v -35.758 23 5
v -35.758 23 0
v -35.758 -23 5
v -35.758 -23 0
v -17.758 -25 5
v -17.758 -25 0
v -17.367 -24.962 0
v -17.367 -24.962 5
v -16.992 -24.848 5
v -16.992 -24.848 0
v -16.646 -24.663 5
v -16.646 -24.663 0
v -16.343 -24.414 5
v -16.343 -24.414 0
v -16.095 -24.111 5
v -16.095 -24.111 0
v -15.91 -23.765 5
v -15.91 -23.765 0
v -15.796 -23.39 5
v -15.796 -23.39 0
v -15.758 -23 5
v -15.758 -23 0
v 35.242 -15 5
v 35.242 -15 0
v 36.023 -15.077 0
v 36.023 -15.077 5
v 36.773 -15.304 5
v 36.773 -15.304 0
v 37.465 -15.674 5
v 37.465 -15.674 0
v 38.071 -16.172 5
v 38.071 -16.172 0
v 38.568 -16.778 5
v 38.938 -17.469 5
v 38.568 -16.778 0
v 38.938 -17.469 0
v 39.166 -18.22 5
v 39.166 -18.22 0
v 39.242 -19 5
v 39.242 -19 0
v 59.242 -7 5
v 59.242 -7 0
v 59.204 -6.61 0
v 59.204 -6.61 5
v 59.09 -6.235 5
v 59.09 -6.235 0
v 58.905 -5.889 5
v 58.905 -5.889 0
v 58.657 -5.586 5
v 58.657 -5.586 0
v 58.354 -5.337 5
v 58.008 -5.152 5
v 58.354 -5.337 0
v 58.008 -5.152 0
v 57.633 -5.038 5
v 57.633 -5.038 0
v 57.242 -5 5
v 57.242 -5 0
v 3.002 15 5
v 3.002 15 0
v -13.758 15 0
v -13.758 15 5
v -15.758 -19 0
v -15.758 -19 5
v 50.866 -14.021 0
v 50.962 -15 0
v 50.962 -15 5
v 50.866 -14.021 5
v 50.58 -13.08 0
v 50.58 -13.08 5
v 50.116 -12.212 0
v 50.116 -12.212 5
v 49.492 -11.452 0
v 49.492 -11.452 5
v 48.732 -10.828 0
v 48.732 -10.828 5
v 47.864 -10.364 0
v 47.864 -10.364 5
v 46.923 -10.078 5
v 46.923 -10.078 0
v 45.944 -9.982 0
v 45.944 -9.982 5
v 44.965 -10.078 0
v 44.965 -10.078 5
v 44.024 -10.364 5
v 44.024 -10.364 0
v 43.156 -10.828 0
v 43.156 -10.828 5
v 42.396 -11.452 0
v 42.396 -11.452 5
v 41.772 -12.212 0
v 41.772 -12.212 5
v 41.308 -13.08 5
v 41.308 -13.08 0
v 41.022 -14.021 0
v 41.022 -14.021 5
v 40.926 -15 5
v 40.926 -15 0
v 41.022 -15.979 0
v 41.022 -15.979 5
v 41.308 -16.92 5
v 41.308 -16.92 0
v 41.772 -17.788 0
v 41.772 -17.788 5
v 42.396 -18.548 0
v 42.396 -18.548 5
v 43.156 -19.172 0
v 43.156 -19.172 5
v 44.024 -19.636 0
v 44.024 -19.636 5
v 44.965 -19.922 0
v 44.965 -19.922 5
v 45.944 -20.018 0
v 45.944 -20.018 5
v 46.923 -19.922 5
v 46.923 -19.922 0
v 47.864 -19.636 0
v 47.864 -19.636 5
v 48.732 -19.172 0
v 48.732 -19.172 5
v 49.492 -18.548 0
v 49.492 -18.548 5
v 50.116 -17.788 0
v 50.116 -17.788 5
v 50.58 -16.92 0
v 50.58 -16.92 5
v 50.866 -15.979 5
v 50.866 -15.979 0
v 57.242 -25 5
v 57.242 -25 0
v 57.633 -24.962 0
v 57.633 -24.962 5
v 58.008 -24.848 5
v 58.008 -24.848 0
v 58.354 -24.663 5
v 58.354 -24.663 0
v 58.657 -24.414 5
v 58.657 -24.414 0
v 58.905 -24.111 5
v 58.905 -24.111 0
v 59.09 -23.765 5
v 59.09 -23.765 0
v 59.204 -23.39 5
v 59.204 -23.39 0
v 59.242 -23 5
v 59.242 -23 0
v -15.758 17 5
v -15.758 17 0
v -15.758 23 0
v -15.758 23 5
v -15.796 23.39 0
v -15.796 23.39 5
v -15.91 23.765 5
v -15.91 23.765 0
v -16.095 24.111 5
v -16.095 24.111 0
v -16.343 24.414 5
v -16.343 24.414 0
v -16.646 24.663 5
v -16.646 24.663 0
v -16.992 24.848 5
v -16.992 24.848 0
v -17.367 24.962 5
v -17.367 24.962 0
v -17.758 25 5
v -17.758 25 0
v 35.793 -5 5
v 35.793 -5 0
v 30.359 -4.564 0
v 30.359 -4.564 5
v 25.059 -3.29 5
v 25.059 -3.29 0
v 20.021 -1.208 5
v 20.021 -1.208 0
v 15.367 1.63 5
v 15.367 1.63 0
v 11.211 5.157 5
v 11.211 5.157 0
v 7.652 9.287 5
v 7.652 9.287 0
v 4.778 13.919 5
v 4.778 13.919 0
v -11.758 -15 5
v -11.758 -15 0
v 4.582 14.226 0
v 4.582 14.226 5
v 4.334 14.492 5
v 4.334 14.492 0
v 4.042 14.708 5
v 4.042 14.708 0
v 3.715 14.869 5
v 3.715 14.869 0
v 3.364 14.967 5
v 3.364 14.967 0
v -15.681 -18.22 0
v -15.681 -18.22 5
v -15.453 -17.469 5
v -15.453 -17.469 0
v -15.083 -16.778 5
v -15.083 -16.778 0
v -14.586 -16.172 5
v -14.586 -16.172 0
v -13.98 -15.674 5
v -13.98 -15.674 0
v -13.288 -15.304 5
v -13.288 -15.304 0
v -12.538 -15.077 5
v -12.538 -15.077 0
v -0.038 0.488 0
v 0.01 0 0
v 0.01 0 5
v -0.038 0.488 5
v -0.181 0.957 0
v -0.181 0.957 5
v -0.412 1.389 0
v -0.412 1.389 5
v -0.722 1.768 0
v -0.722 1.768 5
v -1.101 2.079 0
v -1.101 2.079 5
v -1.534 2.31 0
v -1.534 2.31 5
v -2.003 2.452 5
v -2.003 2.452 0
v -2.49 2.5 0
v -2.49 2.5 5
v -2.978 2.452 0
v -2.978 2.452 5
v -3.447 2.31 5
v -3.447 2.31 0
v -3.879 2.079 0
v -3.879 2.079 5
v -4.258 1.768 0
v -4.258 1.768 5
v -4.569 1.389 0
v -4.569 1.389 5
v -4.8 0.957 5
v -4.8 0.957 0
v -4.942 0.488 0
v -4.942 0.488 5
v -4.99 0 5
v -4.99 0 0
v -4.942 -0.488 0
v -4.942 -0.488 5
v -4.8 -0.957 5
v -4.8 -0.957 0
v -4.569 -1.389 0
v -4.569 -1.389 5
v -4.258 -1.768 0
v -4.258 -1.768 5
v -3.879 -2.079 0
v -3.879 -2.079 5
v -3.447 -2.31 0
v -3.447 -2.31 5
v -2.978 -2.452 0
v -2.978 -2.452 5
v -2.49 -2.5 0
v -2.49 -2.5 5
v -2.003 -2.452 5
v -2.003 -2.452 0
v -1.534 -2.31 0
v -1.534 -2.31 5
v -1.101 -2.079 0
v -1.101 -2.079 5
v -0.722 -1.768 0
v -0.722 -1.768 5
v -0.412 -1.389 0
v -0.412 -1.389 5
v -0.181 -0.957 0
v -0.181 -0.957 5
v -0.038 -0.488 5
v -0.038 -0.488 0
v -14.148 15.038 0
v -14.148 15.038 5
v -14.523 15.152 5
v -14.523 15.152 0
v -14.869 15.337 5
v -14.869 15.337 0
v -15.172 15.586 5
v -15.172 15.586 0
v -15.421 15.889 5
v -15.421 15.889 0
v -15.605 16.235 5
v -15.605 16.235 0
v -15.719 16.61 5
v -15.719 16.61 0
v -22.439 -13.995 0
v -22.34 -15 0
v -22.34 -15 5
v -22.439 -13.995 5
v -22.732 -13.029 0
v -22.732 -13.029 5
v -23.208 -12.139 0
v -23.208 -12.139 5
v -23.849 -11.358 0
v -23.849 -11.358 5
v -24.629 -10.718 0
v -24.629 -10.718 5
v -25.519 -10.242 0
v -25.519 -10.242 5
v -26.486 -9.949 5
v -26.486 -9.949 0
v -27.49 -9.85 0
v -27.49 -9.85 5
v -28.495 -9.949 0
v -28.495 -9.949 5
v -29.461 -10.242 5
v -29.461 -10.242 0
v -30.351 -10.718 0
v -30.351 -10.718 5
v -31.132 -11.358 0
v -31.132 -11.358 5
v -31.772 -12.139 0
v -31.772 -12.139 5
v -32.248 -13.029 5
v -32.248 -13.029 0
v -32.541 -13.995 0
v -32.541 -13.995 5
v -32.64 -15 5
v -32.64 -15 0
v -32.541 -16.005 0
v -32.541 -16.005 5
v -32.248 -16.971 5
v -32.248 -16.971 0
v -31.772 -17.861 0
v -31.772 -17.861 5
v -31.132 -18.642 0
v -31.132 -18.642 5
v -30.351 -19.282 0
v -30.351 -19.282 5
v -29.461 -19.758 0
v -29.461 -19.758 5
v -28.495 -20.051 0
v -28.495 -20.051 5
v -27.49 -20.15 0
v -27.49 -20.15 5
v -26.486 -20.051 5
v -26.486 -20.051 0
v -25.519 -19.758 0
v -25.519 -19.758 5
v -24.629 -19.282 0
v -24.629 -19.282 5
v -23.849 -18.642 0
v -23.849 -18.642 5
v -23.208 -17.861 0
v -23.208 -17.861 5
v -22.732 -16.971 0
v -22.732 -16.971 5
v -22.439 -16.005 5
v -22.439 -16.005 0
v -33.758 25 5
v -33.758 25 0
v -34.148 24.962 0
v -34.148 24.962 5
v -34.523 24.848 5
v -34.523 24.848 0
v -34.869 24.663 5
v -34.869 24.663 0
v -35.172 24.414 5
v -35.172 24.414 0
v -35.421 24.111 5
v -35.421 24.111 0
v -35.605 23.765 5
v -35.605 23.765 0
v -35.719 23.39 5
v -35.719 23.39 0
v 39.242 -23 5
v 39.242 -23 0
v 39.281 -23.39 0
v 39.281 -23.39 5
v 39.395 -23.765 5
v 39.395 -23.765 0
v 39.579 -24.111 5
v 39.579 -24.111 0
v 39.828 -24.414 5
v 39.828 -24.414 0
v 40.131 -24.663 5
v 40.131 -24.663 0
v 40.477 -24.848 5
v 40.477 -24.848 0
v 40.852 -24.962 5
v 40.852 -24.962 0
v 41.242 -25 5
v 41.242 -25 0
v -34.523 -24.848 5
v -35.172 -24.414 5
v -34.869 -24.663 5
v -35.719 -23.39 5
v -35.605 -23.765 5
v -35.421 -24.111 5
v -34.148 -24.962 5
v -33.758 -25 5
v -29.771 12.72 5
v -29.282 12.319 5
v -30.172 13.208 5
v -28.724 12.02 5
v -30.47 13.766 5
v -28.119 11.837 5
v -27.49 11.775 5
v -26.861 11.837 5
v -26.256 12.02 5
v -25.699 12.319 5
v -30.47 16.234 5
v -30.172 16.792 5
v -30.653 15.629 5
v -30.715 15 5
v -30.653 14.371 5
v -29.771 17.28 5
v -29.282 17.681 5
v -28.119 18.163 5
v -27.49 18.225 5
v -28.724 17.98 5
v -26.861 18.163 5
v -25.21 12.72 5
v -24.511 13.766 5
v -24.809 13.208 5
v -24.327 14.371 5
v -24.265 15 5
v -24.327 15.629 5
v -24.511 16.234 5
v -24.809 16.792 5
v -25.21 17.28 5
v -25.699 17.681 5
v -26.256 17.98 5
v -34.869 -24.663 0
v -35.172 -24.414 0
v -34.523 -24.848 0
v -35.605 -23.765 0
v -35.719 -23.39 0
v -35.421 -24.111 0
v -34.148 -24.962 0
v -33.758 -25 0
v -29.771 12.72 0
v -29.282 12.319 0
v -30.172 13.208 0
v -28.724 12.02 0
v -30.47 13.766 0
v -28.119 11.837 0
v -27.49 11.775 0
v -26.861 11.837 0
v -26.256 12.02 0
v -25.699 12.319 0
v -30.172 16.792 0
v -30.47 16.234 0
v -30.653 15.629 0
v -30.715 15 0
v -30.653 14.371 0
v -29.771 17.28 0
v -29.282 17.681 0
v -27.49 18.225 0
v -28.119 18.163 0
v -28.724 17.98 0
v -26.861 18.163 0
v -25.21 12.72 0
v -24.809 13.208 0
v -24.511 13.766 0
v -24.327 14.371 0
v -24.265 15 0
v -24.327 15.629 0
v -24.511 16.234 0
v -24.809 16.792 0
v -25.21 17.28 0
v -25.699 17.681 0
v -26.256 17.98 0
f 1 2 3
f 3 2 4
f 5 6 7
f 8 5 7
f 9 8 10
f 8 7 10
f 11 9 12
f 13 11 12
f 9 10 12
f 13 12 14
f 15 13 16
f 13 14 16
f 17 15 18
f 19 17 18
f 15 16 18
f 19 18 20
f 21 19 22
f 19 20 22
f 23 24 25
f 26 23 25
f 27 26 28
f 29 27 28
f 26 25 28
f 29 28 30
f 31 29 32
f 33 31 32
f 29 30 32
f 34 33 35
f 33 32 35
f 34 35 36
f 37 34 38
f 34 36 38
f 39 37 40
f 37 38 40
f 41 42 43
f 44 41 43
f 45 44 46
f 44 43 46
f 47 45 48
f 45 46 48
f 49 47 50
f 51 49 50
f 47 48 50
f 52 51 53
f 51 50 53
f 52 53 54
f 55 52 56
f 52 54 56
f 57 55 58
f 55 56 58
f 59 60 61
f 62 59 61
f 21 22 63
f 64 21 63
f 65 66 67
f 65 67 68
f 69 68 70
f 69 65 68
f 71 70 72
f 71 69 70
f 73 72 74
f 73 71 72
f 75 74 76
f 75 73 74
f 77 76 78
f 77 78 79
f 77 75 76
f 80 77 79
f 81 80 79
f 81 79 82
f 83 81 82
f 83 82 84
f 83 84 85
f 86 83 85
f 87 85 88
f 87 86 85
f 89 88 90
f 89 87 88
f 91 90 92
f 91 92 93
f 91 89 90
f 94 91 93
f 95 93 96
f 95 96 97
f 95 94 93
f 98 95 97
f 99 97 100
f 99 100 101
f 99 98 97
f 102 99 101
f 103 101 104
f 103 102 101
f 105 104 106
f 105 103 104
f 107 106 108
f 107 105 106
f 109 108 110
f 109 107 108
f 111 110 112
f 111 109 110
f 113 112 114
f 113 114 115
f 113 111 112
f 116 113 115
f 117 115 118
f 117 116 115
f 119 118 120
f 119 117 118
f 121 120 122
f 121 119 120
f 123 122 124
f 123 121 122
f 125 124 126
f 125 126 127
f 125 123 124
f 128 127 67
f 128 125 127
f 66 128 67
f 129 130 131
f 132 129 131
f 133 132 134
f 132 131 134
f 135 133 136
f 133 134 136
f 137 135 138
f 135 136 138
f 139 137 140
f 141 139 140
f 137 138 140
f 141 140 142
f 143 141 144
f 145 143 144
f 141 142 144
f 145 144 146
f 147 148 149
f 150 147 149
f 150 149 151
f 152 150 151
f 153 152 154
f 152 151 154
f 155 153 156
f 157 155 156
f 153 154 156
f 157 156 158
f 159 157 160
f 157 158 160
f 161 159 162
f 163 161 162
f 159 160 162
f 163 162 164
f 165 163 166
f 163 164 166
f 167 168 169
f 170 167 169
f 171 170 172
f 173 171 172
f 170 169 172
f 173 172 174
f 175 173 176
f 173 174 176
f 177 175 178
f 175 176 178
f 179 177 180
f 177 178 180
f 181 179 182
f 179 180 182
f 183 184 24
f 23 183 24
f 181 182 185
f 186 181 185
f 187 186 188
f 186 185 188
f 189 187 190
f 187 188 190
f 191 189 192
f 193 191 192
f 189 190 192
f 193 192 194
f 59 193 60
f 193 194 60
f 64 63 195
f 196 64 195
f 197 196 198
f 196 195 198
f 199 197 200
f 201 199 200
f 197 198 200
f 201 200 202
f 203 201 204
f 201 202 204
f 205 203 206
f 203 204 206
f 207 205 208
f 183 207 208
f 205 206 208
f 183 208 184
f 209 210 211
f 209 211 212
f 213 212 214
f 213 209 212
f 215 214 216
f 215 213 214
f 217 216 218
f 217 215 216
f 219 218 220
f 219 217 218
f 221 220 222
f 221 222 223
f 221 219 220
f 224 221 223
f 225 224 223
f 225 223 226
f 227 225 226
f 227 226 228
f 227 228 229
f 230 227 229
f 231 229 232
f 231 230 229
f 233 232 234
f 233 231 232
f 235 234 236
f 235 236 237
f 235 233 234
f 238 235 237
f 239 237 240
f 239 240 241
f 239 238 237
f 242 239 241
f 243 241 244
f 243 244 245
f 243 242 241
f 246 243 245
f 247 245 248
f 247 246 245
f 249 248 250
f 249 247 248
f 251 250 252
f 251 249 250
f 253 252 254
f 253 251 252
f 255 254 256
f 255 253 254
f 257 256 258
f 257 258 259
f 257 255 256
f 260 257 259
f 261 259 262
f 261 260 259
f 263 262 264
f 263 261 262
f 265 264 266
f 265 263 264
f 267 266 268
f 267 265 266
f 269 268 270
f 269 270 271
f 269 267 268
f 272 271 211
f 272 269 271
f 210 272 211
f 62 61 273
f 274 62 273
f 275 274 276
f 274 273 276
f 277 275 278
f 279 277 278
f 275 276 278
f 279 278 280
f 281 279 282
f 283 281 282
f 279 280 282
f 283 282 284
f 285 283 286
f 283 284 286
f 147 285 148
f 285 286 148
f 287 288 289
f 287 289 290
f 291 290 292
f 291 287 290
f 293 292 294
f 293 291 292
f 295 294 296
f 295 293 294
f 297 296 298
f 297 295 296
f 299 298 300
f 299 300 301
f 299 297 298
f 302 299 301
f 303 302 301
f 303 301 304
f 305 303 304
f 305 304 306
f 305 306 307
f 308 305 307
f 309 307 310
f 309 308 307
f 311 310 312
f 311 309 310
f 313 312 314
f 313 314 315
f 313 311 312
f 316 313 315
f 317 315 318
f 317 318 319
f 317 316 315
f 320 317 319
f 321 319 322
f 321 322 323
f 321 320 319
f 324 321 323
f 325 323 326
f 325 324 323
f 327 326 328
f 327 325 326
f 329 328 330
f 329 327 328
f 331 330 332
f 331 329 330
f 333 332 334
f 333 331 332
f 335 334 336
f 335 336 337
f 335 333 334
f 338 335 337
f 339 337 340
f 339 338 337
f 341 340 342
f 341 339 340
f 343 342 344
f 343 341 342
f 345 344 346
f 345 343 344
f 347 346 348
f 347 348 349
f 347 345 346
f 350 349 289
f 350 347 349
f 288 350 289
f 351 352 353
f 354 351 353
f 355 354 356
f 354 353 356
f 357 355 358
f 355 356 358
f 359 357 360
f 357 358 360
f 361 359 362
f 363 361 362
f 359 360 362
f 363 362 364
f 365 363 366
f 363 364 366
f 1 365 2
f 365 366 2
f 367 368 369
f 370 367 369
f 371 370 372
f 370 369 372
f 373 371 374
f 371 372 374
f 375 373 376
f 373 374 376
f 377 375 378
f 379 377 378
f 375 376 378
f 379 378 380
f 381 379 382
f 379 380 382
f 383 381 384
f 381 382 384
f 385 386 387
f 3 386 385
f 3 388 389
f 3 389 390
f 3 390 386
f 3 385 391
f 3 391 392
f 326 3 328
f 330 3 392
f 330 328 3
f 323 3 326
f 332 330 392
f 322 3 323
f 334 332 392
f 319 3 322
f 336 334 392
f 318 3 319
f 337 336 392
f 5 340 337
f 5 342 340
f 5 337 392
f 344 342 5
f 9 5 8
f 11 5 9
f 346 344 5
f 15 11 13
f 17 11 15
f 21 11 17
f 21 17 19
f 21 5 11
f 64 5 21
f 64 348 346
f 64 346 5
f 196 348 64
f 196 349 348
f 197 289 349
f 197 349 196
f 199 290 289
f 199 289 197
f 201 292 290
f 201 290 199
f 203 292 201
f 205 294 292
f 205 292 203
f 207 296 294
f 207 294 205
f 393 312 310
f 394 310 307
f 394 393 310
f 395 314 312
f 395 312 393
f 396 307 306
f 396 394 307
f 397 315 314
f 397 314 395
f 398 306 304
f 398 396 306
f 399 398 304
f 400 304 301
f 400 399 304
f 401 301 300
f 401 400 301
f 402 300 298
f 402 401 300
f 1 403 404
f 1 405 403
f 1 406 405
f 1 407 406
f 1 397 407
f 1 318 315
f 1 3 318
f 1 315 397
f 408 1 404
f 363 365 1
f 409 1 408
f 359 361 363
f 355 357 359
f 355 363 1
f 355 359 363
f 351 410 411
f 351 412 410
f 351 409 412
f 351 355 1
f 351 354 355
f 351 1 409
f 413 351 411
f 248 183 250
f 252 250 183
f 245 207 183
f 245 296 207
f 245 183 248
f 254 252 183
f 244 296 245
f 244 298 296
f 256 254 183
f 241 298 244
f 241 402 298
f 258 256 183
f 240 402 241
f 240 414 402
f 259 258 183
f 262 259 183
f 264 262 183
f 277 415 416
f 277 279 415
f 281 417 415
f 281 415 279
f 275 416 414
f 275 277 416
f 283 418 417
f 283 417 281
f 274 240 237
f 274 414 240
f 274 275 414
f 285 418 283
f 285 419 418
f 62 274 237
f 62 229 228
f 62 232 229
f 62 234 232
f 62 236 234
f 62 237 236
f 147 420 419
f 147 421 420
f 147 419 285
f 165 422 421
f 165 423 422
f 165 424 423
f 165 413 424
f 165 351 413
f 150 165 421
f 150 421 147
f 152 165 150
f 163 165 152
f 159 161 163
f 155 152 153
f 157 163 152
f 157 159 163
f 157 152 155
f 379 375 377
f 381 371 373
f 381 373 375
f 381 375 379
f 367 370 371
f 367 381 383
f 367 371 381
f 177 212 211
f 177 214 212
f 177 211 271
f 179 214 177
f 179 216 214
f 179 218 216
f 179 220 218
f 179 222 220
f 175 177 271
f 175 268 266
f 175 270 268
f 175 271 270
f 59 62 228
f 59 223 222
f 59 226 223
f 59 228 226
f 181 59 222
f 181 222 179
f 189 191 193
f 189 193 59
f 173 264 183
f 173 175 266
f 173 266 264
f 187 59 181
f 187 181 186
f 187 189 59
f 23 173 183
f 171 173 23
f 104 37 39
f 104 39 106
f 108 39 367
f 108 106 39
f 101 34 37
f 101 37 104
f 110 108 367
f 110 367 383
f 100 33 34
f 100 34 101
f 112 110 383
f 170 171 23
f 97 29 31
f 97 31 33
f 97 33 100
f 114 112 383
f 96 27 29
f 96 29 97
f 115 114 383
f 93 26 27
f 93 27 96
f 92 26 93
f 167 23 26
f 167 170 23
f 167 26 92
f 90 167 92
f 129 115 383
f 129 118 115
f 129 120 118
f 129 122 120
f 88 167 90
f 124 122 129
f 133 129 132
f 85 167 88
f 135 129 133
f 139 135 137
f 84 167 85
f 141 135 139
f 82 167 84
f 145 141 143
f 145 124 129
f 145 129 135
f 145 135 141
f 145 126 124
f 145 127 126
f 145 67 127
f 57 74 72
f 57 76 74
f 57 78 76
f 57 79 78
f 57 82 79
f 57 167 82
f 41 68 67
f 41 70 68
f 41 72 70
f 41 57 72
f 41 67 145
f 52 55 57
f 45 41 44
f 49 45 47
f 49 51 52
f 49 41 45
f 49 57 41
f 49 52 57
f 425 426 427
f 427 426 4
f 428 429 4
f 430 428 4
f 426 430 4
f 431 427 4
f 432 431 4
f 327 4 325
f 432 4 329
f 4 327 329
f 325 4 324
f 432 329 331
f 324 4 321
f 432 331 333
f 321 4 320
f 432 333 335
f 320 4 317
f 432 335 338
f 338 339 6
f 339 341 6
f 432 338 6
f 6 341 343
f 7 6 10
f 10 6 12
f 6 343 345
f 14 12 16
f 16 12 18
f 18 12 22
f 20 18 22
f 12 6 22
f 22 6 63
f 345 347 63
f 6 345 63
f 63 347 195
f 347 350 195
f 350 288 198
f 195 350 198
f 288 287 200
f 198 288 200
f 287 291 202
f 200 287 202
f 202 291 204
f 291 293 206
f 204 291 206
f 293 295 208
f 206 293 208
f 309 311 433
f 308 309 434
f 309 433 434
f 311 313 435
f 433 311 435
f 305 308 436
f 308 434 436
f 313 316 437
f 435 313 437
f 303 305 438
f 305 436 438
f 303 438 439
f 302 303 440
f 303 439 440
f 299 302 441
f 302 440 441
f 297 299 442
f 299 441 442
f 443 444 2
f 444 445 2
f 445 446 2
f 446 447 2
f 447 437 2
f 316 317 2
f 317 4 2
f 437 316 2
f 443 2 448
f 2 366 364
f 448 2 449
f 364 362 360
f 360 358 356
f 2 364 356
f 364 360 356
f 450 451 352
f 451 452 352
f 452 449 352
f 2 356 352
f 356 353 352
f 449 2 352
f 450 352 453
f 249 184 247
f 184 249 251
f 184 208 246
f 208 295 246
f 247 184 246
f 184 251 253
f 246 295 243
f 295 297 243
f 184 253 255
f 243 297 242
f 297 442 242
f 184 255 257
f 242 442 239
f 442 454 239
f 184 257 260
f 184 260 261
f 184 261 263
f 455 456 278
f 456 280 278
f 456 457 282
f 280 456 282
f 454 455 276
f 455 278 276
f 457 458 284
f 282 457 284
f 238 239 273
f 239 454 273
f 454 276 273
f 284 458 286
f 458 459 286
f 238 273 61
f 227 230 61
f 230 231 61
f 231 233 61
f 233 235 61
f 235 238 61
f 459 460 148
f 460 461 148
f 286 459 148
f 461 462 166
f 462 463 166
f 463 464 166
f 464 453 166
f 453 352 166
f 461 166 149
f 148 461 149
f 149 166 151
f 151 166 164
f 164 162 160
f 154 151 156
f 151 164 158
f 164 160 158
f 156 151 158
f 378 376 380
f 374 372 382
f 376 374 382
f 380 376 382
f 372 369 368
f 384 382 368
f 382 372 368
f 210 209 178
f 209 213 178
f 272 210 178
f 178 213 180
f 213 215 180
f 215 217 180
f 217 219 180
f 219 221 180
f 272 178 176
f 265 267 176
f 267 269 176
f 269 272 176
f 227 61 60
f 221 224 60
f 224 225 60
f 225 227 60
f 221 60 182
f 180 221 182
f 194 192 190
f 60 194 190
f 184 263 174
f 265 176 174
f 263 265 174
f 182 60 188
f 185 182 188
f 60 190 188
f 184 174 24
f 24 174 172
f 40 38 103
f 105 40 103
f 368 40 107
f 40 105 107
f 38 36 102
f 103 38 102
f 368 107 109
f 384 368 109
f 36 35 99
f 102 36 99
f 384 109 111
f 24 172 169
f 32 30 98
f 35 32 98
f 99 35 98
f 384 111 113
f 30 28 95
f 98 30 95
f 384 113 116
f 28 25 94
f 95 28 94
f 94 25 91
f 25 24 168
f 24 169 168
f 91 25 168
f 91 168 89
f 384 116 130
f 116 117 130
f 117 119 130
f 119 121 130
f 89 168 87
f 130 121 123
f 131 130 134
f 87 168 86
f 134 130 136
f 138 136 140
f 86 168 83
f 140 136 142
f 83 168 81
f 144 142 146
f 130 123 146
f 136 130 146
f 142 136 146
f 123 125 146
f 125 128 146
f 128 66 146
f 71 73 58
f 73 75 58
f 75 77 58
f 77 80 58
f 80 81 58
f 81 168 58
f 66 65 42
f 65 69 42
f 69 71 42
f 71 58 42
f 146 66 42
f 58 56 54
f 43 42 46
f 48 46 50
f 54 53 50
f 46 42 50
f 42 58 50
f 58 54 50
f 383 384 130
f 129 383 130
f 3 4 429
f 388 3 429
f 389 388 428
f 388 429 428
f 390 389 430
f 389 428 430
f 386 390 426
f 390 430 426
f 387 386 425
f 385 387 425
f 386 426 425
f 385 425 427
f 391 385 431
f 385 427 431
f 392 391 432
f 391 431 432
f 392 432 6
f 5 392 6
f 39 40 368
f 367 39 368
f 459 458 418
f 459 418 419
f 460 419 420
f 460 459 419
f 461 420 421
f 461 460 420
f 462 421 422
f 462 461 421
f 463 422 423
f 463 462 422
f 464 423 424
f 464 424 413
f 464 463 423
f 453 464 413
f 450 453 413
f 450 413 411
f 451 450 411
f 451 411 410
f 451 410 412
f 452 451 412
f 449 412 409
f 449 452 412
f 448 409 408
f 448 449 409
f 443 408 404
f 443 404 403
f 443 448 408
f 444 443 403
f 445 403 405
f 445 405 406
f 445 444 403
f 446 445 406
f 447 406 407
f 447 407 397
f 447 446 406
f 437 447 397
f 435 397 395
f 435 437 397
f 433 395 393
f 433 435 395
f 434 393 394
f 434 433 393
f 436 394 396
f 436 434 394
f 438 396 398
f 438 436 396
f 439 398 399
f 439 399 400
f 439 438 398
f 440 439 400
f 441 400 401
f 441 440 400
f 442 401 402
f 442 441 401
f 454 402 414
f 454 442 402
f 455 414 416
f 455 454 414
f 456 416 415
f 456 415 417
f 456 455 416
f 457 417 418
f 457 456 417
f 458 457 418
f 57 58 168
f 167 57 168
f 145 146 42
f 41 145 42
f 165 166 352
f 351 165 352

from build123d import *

# Parameters (mm, degrees)
SKETCH1_R           = 5.018077717
SKETCH1_R_2         = 5.15
SKETCH1_R_3         = 3.225
SKETCH1_R_4         = 2.5
BOSS_EXTRUDE1_DEPTH = 5


with BuildPart() as part:
    # Sketch1 → Boss-Extrude1 (new body)
    with BuildSketch(Plane.XY):
        with BuildLine():
            Line((4.242424242, -15), (35.242424242, -15))
            ThreePointArc((35.242424242, -15), (38.070851367, -16.171572875), (39.242424242, -19))
            Line((39.242424242, -19), (39.242424242, -23))
            ThreePointArc((39.242424242, -23), (39.82821068, -24.414213562), (41.242424242, -25))
            Line((41.242424242, -25), (57.242424242, -25))
            ThreePointArc((57.242424242, -25), (58.656637805, -24.414213562), (59.242424242, -23))
            Line((59.242424242, -23), (59.242424242, -7))
            ThreePointArc((59.242424242, -7), (58.656637805, -5.585786438), (57.242424242, -5))
            Line((57.242424242, -5), (35.792732382, -5))
            ThreePointArc((35.792732382, -5), (17.638610474, 0.120331449), (4.778243752, 13.91891486))
            ThreePointArc((4.778243752, 13.91891486), (4.04159661, 14.708483204), (3.001844168, 15))
            Line((3.001844168, 15), (-13.757575758, 15))
            ThreePointArc((-13.757575758, 15), (-15.17178932, 15.585786438), (-15.757575758, 17))
            Line((-15.757575758, 17), (-15.757575758, 23))
            ThreePointArc((-15.757575758, 23), (-16.343362195, 24.414213562), (-17.757575758, 25))
            Line((-17.757575758, 25), (-33.757575758, 25))
            ThreePointArc((-33.757575758, 25), (-35.17178932, 24.414213562), (-35.757575758, 23))
            Line((-35.757575758, 23), (-35.757575758, -23))
            ThreePointArc((-35.757575758, -23), (-35.17178932, -24.414213562), (-33.757575758, -25))
            Line((-33.757575758, -25), (-17.757575758, -25))
            ThreePointArc((-17.757575758, -25), (-16.343362195, -24.414213562), (-15.757575758, -23))
            Line((-15.757575758, -23), (-15.757575758, -19))
            ThreePointArc((-15.757575758, -19), (-14.586002882, -16.171572875), (-11.757575758, -15))
            Line((-11.757575758, -15), (4.242424242, -15))
        make_face()
        with Locations((45.944077131, -15)):
            Circle(SKETCH1_R, mode=Mode.SUBTRACT)
        with Locations((-27.490266303, -15)):
            Circle(SKETCH1_R_2, mode=Mode.SUBTRACT)
        with Locations((-27.490266303, 15)):
            Circle(SKETCH1_R_3, mode=Mode.SUBTRACT)
        with Locations((-2.490266303, 0)):
            Circle(SKETCH1_R_4, mode=Mode.SUBTRACT)
    extrude(amount=BOSS_EXTRUDE1_DEPTH)


solid = part.part
